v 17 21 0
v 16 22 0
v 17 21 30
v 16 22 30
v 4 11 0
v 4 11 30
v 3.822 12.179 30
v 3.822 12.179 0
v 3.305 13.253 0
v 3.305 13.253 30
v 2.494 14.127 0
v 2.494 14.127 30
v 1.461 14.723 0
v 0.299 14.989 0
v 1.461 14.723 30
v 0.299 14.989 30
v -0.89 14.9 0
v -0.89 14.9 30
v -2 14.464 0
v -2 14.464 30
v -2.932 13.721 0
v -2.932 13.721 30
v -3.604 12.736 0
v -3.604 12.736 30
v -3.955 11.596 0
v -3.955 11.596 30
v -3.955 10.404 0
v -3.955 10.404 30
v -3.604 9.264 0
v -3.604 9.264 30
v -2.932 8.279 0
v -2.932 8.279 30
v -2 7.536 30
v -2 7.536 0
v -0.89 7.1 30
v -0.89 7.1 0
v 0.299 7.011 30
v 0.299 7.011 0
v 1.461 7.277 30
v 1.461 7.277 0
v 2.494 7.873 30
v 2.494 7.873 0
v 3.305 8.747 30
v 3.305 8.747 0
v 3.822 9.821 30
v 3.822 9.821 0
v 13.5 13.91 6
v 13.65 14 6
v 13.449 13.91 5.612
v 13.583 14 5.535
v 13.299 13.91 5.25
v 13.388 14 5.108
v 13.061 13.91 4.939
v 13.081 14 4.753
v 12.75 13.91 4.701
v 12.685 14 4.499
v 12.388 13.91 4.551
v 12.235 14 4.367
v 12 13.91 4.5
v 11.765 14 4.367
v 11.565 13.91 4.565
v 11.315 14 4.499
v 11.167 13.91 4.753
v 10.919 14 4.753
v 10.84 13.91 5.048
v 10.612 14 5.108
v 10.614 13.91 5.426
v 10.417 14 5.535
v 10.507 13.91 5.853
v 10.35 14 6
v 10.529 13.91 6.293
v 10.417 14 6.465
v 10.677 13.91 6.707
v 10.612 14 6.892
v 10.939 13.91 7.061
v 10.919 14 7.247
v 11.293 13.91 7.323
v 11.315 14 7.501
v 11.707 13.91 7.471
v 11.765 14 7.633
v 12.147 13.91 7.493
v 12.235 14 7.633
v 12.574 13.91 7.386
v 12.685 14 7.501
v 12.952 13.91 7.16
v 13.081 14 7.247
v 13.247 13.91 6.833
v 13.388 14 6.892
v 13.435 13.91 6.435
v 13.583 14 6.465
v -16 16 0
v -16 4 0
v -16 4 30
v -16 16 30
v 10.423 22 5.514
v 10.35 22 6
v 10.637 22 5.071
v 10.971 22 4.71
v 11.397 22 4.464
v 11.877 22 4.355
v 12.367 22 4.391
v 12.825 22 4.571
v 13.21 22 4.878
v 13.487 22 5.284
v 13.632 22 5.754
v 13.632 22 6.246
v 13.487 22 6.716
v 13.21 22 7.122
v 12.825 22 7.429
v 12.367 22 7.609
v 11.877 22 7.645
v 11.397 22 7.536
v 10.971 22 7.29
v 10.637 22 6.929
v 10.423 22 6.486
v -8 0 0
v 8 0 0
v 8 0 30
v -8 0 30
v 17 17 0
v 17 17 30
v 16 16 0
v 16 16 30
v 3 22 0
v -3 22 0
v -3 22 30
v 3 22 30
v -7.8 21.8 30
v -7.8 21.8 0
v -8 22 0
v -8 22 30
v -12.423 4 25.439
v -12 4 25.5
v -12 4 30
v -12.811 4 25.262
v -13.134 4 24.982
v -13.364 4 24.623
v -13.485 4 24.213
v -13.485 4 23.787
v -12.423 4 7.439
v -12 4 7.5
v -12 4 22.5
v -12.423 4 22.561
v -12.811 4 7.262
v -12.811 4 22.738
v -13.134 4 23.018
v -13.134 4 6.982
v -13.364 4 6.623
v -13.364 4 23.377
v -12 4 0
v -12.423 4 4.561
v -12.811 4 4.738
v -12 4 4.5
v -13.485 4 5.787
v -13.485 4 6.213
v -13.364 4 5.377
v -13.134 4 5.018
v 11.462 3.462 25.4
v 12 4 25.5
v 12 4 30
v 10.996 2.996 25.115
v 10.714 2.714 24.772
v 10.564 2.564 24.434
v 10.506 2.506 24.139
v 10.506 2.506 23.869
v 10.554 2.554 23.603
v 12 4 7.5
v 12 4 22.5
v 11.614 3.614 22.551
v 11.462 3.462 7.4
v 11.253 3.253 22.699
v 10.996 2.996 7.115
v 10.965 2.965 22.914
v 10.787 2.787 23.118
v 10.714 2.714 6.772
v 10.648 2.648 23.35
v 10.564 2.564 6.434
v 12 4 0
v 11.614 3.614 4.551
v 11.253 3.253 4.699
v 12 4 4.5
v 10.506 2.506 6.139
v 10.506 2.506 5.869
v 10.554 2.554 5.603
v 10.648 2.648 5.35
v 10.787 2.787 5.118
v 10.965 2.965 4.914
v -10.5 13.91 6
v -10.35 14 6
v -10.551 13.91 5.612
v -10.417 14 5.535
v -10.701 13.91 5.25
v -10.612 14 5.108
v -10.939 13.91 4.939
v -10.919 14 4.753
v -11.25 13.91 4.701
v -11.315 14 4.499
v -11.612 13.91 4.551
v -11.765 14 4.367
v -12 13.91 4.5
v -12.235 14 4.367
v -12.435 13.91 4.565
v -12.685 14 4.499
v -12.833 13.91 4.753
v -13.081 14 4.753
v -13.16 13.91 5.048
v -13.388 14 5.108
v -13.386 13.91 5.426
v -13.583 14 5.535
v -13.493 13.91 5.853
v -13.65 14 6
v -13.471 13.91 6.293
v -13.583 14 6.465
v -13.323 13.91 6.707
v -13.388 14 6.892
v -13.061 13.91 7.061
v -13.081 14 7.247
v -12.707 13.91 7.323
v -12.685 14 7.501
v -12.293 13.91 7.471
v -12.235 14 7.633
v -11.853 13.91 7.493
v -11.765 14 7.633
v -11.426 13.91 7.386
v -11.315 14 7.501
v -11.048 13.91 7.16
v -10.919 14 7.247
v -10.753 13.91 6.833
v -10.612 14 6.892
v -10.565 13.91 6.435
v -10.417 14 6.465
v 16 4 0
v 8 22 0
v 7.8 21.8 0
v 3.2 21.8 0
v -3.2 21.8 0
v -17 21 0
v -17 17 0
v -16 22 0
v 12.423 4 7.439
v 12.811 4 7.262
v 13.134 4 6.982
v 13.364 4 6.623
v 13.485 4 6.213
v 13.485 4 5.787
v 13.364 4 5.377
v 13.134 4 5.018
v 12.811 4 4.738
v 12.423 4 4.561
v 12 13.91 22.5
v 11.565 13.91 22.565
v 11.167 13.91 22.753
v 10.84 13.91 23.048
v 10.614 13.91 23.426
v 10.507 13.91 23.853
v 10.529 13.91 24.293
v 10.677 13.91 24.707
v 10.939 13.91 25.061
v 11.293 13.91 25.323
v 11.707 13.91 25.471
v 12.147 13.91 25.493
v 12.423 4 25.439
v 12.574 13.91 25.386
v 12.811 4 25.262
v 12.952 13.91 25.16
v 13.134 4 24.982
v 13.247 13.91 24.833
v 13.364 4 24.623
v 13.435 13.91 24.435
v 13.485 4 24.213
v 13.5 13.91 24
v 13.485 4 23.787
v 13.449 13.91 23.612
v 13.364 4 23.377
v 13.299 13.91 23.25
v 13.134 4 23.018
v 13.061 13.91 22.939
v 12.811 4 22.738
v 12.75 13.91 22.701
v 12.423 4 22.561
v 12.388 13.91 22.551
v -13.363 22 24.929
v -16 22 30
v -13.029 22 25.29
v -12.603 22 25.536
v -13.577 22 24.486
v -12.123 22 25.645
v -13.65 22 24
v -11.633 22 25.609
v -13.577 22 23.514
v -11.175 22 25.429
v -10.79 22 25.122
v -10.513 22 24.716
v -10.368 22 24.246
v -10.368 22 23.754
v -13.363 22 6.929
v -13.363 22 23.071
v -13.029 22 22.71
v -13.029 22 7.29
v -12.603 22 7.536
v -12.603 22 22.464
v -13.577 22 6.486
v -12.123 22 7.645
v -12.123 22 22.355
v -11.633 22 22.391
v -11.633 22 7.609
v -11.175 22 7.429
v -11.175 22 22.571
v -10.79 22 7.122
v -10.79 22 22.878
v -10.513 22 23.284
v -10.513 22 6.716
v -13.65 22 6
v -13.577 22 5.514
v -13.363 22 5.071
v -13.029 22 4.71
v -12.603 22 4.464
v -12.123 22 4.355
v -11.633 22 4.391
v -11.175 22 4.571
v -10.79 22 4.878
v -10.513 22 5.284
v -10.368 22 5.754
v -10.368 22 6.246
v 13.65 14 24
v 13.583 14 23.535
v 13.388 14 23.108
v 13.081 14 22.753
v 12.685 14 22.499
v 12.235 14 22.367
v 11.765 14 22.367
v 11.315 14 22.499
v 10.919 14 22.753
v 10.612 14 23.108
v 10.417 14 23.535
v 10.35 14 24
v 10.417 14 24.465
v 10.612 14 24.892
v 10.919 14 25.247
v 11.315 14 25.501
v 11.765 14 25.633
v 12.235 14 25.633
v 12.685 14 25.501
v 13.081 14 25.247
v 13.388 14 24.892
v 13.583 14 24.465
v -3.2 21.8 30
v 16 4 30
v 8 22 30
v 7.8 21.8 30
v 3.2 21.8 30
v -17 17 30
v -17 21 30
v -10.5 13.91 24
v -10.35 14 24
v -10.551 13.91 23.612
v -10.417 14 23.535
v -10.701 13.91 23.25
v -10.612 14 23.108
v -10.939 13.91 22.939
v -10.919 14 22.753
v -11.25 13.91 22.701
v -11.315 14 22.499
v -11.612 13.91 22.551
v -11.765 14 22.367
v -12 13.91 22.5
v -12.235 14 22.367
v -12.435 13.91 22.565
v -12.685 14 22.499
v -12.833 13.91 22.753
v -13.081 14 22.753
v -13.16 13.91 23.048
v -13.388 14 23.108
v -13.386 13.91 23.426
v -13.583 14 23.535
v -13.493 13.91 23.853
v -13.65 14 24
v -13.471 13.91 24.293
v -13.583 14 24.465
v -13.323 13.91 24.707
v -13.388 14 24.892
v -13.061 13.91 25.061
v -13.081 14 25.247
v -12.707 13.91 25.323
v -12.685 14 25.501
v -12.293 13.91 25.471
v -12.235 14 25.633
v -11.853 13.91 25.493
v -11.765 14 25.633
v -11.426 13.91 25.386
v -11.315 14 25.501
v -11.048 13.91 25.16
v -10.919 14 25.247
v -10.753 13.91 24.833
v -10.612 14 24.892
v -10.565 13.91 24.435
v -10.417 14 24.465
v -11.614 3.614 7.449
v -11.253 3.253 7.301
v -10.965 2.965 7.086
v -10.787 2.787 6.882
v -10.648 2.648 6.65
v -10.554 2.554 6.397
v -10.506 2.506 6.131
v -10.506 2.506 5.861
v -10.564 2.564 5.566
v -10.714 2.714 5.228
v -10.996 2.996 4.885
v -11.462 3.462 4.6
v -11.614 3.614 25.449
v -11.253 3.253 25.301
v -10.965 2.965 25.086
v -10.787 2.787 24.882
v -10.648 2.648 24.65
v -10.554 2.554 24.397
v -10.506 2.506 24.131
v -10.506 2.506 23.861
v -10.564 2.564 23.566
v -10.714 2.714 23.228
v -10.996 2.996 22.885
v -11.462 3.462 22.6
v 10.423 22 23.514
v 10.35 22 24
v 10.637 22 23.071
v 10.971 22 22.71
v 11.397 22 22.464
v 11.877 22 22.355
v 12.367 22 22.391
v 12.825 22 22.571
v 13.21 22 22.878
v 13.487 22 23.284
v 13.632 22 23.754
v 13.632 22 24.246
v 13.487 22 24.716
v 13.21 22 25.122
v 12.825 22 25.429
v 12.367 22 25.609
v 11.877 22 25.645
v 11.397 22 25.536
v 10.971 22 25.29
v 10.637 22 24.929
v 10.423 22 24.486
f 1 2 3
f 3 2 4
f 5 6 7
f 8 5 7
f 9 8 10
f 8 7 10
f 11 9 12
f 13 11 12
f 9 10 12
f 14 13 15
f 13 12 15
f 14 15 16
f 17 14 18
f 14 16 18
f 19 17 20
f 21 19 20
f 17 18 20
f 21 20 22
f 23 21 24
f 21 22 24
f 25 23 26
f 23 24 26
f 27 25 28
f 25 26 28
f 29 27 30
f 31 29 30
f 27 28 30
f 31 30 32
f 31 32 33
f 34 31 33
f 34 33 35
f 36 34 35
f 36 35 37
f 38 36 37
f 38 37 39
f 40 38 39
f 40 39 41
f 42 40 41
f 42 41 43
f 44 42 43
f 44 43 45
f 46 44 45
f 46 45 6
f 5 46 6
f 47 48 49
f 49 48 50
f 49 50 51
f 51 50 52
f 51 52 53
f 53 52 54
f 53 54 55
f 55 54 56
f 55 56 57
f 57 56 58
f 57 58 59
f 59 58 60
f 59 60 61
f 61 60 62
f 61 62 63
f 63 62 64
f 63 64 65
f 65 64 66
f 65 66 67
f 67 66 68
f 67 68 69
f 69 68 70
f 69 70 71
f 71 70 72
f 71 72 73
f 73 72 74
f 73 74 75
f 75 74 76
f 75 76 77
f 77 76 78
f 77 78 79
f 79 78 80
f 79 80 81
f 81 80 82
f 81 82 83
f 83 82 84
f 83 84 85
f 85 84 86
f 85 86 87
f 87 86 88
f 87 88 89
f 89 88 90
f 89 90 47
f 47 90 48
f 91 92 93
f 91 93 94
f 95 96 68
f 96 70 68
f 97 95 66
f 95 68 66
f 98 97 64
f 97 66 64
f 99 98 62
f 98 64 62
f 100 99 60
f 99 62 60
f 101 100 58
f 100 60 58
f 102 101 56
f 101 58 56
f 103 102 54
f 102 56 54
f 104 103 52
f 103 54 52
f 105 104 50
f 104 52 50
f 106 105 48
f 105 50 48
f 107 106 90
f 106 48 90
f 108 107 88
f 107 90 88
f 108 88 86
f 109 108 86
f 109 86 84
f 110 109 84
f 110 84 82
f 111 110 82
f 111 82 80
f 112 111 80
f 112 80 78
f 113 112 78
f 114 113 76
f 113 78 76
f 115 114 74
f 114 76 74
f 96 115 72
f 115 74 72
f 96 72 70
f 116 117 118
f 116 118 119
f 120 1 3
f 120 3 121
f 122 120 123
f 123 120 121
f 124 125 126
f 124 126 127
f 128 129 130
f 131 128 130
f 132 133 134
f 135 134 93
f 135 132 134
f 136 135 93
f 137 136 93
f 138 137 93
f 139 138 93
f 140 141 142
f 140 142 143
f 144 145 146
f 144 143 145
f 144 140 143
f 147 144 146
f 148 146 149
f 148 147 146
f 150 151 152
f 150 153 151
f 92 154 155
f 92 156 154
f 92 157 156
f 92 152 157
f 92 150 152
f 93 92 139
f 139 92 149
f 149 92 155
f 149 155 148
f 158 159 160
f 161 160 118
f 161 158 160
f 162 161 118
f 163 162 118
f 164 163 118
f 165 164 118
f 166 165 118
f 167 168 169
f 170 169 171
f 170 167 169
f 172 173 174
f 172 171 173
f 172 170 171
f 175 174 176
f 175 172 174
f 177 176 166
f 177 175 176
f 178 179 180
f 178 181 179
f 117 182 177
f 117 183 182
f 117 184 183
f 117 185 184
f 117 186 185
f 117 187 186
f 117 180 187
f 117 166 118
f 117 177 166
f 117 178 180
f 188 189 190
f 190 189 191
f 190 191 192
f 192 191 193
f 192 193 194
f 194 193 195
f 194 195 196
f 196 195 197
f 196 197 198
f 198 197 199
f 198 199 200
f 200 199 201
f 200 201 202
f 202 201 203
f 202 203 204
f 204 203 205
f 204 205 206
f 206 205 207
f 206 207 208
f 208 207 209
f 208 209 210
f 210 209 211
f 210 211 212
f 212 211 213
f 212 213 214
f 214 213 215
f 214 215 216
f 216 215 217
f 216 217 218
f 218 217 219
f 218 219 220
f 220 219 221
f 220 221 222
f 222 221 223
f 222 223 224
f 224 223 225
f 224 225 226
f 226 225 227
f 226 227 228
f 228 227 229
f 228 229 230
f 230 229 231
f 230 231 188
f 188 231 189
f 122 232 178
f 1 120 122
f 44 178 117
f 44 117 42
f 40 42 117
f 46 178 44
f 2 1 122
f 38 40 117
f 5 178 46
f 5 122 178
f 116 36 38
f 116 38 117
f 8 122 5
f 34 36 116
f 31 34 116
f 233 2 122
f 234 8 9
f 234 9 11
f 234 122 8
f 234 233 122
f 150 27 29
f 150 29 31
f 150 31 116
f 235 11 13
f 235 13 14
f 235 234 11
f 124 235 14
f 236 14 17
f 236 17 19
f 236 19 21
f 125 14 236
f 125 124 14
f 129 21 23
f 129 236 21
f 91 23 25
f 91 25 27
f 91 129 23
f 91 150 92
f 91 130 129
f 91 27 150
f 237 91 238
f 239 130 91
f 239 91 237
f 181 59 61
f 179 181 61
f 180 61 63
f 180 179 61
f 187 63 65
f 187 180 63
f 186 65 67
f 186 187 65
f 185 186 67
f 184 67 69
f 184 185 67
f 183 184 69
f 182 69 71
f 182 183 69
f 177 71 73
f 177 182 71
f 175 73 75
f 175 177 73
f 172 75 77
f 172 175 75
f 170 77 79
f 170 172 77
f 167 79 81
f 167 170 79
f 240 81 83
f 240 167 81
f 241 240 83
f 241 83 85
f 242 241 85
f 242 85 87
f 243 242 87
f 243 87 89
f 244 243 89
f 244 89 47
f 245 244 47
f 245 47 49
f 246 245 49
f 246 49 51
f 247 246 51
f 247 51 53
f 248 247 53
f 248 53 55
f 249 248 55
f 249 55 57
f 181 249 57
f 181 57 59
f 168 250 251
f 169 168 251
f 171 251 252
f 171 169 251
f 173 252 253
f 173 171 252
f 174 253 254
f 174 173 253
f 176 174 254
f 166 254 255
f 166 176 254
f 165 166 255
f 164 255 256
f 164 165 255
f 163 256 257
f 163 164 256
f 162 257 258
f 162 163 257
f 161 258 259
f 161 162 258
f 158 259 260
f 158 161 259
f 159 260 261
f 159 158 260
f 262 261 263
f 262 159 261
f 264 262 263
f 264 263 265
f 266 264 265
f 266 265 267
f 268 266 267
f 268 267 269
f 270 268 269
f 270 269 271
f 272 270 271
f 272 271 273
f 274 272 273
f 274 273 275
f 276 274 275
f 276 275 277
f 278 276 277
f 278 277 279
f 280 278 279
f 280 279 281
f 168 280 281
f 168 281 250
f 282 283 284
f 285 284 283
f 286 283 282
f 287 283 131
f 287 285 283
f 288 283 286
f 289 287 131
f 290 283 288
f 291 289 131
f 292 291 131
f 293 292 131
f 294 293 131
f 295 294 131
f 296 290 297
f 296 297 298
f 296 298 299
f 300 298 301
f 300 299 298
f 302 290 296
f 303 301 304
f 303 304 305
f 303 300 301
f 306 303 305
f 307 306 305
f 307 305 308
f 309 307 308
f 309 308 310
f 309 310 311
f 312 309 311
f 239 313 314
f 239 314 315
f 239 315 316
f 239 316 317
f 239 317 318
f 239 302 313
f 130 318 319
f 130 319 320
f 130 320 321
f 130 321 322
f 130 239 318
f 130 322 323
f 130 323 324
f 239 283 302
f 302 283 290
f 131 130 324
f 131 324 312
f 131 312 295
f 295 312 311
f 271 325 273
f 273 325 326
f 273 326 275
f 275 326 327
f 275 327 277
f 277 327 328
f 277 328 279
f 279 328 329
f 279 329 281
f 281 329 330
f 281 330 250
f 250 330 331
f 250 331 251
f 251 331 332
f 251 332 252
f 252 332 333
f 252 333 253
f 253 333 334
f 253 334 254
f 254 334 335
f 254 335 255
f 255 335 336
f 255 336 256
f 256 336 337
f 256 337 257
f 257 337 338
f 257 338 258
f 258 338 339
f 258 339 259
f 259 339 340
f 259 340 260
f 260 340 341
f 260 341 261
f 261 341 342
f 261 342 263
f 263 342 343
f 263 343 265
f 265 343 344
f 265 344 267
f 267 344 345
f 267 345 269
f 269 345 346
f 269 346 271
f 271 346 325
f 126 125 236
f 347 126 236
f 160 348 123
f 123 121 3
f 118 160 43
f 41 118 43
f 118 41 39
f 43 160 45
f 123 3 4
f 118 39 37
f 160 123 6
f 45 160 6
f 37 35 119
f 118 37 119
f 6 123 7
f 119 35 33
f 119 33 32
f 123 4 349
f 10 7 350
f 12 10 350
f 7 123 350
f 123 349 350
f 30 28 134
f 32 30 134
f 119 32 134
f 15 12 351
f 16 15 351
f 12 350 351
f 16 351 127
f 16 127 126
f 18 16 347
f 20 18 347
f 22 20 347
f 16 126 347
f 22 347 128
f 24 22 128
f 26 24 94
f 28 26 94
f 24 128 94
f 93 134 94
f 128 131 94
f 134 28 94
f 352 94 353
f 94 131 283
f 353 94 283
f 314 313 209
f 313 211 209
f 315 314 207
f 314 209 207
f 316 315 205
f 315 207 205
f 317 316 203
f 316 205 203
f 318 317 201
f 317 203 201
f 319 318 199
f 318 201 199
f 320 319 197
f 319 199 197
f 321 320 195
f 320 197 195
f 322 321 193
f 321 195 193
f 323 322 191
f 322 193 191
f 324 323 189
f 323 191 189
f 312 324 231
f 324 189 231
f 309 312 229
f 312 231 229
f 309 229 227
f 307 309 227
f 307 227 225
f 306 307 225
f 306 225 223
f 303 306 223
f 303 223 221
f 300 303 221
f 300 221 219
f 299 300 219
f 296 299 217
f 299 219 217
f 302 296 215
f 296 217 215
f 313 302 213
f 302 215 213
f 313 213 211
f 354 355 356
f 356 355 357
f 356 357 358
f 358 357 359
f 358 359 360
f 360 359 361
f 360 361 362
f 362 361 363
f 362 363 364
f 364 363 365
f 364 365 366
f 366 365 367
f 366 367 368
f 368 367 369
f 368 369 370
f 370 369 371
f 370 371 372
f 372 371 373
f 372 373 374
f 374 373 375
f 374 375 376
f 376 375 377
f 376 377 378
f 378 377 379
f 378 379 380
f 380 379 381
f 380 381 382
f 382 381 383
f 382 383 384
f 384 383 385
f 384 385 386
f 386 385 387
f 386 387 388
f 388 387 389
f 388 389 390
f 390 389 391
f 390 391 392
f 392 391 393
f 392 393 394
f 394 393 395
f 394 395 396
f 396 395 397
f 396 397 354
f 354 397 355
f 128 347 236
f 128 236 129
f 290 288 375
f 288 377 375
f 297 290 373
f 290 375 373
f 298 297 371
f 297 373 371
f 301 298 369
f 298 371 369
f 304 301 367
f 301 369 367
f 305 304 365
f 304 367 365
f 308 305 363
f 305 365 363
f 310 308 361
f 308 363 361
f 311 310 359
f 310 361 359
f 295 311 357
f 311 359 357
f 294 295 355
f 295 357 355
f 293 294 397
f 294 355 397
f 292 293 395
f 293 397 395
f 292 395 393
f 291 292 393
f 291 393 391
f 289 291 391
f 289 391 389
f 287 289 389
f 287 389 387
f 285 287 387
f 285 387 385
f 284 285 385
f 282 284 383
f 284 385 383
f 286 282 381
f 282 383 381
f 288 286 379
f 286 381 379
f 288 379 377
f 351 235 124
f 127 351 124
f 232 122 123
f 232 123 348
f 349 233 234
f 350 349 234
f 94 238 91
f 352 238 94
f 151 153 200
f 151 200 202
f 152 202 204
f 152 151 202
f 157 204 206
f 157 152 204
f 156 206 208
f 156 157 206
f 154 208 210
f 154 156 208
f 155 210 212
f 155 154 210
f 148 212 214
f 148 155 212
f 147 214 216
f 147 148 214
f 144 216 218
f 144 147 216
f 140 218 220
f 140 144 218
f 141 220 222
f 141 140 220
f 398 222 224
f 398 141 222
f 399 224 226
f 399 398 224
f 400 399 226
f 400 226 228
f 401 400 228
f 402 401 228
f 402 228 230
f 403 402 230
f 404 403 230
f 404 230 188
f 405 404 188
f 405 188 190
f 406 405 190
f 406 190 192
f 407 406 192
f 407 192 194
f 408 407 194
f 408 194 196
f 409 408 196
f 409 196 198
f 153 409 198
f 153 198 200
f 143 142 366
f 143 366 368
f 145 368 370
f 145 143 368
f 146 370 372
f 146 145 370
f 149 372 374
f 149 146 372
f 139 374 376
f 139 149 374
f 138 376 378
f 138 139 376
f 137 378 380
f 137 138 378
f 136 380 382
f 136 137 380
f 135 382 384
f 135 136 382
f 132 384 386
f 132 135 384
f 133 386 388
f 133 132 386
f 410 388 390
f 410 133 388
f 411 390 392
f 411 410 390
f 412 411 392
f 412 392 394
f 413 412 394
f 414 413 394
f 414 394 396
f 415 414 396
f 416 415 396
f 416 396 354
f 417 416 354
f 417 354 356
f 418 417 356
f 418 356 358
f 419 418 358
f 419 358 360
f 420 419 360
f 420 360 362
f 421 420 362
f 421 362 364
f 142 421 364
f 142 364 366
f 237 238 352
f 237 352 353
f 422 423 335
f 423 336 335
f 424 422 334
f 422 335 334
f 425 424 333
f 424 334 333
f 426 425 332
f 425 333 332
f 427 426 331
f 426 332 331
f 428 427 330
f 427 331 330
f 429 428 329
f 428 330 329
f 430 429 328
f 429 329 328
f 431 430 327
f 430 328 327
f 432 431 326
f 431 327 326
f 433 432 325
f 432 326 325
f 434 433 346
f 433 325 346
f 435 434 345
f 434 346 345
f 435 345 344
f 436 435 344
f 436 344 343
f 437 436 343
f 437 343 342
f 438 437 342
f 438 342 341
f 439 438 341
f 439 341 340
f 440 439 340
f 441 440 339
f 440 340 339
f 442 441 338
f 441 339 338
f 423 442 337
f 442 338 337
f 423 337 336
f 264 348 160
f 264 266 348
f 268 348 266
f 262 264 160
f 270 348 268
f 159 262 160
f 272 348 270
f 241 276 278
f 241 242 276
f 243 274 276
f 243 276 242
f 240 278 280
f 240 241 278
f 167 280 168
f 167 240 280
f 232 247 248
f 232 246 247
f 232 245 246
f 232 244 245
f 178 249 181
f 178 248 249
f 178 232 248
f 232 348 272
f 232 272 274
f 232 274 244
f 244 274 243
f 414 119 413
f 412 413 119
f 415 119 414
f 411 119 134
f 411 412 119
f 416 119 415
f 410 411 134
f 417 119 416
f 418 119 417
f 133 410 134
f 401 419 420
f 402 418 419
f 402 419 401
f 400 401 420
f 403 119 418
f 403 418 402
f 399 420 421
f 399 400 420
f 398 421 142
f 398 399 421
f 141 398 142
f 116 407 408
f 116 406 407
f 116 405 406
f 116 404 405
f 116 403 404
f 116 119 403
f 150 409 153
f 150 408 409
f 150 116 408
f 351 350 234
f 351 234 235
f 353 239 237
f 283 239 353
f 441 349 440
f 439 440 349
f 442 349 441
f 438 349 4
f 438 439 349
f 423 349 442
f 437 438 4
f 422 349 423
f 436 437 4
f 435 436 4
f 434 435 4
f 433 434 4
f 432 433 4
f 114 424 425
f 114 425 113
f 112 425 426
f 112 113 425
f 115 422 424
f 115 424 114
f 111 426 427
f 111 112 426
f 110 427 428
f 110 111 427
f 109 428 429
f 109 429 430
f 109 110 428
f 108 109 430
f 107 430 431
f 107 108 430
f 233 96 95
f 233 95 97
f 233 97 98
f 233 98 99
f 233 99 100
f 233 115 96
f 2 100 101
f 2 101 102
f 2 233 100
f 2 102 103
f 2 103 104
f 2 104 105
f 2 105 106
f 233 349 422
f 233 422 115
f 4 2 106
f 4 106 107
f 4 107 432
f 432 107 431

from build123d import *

# Parameters (mm, degrees)
BOSS_EXTRUDE1_DEPTH     = 30
SKETCH2_R               = 4
CUT_EXTRUDE1_DEPTH      = 41.902322672
CHAMFER1_SIZE           = 1
CUT_EXTRUDE3_DEPTH      = 41.902322672
CUT_EXTRUDE3_DEPTH_BACK = 41.902322672
SKETCH7_R               = 1.5
M4_TAPPED_HOLE1_D       = 3.3
M4_TAPPED_HOLE1_DEPTH   = 8
M4_TAPPED_HOLE1_TIP     = 0.991420021
CUT_EXTRUDE4_DEPTH      = 41.902322672


with BuildPart() as part:
    # Sketch1 → Boss-Extrude1 (new body)
    with BuildSketch(Plane.XY):
        Polygon((8, 0), (-8, 0), (-12, 4), (-16, 4), (-16, 16), (-17, 16), (-17, 22), (17, 22), (17, 16), (16, 16), (16, 4), (12, 4), align=None)
    extrude(amount=BOSS_EXTRUDE1_DEPTH)

    # Sketch2 → Cut-Extrude1 (cut, through all)
    with BuildSketch(Plane.XY.offset(30)):
        with Locations((0, 11)):
            Circle(SKETCH2_R)
    extrude(amount=-CUT_EXTRUDE1_DEPTH, mode=Mode.SUBTRACT)

    # Chamfer1
    chamfer1_edges = [part.edges().sort_by_distance(p)[0] for p in [
        (-17, 16, 15),
        (17, 16, 15),
        (-17, 22, 15),
        (17, 22, 15),
    ]]
    chamfer(chamfer1_edges, length=CHAMFER1_SIZE - 0.0001)  # a hair under: the kernel refuses the full size

    # Sketch7 → Cut-Extrude3 (cut, two sides: drawn at the far end of the back side and taken through both)
    with BuildSketch(Plane(origin=(0, 22, 0), x_dir=(1, 0, 0), z_dir=(0, 1, 0)).offset(-CUT_EXTRUDE3_DEPTH_BACK)):
        with Locations(Location((-12, -6, 0), (0, 0, 90))):
            Circle(SKETCH7_R)
        with Locations(Location((-12, -24, 0), (0, 0, 90))):
            Circle(SKETCH7_R)
        with Locations(Location((12, -6, 0), (0, 0, 90))):
            Circle(SKETCH7_R)
        with Locations(Location((12, -24, 0), (0, 0, 90))):
            Circle(SKETCH7_R)
    extrude(amount=CUT_EXTRUDE3_DEPTH + CUT_EXTRUDE3_DEPTH_BACK, mode=Mode.SUBTRACT)

    # M4 Tapped Hole1
    with Locations(Plane(origin=(0, 22, 0), x_dir=(1, 0, 0), z_dir=(0, 1, 0))):
        with Locations((-12, -6), (12, -6), (-12, -24), (12, -24)):
            Hole(M4_TAPPED_HOLE1_D / 2, depth=M4_TAPPED_HOLE1_DEPTH)
            with Locations((0, 0, -(M4_TAPPED_HOLE1_DEPTH + M4_TAPPED_HOLE1_TIP / 2))):  # 118° drill point
                Cone(0, M4_TAPPED_HOLE1_D / 2, M4_TAPPED_HOLE1_TIP, mode=Mode.SUBTRACT)

    # Sketch8 → Cut-Extrude4 (cut, through all)
    with BuildSketch(Plane(origin=(0, 0, 0), x_dir=(-1, 0, 0), z_dir=(0, 0, -1))):
        Polygon((8, 22), (3, 22), (3.2, 21.8), (7.8, 21.8), align=None)
        Polygon((-3, 22), (-8, 22), (-7.8, 21.8), (-3.2, 21.8), align=None)
    extrude(amount=-CUT_EXTRUDE4_DEPTH, mode=Mode.SUBTRACT)


solid = part.part
